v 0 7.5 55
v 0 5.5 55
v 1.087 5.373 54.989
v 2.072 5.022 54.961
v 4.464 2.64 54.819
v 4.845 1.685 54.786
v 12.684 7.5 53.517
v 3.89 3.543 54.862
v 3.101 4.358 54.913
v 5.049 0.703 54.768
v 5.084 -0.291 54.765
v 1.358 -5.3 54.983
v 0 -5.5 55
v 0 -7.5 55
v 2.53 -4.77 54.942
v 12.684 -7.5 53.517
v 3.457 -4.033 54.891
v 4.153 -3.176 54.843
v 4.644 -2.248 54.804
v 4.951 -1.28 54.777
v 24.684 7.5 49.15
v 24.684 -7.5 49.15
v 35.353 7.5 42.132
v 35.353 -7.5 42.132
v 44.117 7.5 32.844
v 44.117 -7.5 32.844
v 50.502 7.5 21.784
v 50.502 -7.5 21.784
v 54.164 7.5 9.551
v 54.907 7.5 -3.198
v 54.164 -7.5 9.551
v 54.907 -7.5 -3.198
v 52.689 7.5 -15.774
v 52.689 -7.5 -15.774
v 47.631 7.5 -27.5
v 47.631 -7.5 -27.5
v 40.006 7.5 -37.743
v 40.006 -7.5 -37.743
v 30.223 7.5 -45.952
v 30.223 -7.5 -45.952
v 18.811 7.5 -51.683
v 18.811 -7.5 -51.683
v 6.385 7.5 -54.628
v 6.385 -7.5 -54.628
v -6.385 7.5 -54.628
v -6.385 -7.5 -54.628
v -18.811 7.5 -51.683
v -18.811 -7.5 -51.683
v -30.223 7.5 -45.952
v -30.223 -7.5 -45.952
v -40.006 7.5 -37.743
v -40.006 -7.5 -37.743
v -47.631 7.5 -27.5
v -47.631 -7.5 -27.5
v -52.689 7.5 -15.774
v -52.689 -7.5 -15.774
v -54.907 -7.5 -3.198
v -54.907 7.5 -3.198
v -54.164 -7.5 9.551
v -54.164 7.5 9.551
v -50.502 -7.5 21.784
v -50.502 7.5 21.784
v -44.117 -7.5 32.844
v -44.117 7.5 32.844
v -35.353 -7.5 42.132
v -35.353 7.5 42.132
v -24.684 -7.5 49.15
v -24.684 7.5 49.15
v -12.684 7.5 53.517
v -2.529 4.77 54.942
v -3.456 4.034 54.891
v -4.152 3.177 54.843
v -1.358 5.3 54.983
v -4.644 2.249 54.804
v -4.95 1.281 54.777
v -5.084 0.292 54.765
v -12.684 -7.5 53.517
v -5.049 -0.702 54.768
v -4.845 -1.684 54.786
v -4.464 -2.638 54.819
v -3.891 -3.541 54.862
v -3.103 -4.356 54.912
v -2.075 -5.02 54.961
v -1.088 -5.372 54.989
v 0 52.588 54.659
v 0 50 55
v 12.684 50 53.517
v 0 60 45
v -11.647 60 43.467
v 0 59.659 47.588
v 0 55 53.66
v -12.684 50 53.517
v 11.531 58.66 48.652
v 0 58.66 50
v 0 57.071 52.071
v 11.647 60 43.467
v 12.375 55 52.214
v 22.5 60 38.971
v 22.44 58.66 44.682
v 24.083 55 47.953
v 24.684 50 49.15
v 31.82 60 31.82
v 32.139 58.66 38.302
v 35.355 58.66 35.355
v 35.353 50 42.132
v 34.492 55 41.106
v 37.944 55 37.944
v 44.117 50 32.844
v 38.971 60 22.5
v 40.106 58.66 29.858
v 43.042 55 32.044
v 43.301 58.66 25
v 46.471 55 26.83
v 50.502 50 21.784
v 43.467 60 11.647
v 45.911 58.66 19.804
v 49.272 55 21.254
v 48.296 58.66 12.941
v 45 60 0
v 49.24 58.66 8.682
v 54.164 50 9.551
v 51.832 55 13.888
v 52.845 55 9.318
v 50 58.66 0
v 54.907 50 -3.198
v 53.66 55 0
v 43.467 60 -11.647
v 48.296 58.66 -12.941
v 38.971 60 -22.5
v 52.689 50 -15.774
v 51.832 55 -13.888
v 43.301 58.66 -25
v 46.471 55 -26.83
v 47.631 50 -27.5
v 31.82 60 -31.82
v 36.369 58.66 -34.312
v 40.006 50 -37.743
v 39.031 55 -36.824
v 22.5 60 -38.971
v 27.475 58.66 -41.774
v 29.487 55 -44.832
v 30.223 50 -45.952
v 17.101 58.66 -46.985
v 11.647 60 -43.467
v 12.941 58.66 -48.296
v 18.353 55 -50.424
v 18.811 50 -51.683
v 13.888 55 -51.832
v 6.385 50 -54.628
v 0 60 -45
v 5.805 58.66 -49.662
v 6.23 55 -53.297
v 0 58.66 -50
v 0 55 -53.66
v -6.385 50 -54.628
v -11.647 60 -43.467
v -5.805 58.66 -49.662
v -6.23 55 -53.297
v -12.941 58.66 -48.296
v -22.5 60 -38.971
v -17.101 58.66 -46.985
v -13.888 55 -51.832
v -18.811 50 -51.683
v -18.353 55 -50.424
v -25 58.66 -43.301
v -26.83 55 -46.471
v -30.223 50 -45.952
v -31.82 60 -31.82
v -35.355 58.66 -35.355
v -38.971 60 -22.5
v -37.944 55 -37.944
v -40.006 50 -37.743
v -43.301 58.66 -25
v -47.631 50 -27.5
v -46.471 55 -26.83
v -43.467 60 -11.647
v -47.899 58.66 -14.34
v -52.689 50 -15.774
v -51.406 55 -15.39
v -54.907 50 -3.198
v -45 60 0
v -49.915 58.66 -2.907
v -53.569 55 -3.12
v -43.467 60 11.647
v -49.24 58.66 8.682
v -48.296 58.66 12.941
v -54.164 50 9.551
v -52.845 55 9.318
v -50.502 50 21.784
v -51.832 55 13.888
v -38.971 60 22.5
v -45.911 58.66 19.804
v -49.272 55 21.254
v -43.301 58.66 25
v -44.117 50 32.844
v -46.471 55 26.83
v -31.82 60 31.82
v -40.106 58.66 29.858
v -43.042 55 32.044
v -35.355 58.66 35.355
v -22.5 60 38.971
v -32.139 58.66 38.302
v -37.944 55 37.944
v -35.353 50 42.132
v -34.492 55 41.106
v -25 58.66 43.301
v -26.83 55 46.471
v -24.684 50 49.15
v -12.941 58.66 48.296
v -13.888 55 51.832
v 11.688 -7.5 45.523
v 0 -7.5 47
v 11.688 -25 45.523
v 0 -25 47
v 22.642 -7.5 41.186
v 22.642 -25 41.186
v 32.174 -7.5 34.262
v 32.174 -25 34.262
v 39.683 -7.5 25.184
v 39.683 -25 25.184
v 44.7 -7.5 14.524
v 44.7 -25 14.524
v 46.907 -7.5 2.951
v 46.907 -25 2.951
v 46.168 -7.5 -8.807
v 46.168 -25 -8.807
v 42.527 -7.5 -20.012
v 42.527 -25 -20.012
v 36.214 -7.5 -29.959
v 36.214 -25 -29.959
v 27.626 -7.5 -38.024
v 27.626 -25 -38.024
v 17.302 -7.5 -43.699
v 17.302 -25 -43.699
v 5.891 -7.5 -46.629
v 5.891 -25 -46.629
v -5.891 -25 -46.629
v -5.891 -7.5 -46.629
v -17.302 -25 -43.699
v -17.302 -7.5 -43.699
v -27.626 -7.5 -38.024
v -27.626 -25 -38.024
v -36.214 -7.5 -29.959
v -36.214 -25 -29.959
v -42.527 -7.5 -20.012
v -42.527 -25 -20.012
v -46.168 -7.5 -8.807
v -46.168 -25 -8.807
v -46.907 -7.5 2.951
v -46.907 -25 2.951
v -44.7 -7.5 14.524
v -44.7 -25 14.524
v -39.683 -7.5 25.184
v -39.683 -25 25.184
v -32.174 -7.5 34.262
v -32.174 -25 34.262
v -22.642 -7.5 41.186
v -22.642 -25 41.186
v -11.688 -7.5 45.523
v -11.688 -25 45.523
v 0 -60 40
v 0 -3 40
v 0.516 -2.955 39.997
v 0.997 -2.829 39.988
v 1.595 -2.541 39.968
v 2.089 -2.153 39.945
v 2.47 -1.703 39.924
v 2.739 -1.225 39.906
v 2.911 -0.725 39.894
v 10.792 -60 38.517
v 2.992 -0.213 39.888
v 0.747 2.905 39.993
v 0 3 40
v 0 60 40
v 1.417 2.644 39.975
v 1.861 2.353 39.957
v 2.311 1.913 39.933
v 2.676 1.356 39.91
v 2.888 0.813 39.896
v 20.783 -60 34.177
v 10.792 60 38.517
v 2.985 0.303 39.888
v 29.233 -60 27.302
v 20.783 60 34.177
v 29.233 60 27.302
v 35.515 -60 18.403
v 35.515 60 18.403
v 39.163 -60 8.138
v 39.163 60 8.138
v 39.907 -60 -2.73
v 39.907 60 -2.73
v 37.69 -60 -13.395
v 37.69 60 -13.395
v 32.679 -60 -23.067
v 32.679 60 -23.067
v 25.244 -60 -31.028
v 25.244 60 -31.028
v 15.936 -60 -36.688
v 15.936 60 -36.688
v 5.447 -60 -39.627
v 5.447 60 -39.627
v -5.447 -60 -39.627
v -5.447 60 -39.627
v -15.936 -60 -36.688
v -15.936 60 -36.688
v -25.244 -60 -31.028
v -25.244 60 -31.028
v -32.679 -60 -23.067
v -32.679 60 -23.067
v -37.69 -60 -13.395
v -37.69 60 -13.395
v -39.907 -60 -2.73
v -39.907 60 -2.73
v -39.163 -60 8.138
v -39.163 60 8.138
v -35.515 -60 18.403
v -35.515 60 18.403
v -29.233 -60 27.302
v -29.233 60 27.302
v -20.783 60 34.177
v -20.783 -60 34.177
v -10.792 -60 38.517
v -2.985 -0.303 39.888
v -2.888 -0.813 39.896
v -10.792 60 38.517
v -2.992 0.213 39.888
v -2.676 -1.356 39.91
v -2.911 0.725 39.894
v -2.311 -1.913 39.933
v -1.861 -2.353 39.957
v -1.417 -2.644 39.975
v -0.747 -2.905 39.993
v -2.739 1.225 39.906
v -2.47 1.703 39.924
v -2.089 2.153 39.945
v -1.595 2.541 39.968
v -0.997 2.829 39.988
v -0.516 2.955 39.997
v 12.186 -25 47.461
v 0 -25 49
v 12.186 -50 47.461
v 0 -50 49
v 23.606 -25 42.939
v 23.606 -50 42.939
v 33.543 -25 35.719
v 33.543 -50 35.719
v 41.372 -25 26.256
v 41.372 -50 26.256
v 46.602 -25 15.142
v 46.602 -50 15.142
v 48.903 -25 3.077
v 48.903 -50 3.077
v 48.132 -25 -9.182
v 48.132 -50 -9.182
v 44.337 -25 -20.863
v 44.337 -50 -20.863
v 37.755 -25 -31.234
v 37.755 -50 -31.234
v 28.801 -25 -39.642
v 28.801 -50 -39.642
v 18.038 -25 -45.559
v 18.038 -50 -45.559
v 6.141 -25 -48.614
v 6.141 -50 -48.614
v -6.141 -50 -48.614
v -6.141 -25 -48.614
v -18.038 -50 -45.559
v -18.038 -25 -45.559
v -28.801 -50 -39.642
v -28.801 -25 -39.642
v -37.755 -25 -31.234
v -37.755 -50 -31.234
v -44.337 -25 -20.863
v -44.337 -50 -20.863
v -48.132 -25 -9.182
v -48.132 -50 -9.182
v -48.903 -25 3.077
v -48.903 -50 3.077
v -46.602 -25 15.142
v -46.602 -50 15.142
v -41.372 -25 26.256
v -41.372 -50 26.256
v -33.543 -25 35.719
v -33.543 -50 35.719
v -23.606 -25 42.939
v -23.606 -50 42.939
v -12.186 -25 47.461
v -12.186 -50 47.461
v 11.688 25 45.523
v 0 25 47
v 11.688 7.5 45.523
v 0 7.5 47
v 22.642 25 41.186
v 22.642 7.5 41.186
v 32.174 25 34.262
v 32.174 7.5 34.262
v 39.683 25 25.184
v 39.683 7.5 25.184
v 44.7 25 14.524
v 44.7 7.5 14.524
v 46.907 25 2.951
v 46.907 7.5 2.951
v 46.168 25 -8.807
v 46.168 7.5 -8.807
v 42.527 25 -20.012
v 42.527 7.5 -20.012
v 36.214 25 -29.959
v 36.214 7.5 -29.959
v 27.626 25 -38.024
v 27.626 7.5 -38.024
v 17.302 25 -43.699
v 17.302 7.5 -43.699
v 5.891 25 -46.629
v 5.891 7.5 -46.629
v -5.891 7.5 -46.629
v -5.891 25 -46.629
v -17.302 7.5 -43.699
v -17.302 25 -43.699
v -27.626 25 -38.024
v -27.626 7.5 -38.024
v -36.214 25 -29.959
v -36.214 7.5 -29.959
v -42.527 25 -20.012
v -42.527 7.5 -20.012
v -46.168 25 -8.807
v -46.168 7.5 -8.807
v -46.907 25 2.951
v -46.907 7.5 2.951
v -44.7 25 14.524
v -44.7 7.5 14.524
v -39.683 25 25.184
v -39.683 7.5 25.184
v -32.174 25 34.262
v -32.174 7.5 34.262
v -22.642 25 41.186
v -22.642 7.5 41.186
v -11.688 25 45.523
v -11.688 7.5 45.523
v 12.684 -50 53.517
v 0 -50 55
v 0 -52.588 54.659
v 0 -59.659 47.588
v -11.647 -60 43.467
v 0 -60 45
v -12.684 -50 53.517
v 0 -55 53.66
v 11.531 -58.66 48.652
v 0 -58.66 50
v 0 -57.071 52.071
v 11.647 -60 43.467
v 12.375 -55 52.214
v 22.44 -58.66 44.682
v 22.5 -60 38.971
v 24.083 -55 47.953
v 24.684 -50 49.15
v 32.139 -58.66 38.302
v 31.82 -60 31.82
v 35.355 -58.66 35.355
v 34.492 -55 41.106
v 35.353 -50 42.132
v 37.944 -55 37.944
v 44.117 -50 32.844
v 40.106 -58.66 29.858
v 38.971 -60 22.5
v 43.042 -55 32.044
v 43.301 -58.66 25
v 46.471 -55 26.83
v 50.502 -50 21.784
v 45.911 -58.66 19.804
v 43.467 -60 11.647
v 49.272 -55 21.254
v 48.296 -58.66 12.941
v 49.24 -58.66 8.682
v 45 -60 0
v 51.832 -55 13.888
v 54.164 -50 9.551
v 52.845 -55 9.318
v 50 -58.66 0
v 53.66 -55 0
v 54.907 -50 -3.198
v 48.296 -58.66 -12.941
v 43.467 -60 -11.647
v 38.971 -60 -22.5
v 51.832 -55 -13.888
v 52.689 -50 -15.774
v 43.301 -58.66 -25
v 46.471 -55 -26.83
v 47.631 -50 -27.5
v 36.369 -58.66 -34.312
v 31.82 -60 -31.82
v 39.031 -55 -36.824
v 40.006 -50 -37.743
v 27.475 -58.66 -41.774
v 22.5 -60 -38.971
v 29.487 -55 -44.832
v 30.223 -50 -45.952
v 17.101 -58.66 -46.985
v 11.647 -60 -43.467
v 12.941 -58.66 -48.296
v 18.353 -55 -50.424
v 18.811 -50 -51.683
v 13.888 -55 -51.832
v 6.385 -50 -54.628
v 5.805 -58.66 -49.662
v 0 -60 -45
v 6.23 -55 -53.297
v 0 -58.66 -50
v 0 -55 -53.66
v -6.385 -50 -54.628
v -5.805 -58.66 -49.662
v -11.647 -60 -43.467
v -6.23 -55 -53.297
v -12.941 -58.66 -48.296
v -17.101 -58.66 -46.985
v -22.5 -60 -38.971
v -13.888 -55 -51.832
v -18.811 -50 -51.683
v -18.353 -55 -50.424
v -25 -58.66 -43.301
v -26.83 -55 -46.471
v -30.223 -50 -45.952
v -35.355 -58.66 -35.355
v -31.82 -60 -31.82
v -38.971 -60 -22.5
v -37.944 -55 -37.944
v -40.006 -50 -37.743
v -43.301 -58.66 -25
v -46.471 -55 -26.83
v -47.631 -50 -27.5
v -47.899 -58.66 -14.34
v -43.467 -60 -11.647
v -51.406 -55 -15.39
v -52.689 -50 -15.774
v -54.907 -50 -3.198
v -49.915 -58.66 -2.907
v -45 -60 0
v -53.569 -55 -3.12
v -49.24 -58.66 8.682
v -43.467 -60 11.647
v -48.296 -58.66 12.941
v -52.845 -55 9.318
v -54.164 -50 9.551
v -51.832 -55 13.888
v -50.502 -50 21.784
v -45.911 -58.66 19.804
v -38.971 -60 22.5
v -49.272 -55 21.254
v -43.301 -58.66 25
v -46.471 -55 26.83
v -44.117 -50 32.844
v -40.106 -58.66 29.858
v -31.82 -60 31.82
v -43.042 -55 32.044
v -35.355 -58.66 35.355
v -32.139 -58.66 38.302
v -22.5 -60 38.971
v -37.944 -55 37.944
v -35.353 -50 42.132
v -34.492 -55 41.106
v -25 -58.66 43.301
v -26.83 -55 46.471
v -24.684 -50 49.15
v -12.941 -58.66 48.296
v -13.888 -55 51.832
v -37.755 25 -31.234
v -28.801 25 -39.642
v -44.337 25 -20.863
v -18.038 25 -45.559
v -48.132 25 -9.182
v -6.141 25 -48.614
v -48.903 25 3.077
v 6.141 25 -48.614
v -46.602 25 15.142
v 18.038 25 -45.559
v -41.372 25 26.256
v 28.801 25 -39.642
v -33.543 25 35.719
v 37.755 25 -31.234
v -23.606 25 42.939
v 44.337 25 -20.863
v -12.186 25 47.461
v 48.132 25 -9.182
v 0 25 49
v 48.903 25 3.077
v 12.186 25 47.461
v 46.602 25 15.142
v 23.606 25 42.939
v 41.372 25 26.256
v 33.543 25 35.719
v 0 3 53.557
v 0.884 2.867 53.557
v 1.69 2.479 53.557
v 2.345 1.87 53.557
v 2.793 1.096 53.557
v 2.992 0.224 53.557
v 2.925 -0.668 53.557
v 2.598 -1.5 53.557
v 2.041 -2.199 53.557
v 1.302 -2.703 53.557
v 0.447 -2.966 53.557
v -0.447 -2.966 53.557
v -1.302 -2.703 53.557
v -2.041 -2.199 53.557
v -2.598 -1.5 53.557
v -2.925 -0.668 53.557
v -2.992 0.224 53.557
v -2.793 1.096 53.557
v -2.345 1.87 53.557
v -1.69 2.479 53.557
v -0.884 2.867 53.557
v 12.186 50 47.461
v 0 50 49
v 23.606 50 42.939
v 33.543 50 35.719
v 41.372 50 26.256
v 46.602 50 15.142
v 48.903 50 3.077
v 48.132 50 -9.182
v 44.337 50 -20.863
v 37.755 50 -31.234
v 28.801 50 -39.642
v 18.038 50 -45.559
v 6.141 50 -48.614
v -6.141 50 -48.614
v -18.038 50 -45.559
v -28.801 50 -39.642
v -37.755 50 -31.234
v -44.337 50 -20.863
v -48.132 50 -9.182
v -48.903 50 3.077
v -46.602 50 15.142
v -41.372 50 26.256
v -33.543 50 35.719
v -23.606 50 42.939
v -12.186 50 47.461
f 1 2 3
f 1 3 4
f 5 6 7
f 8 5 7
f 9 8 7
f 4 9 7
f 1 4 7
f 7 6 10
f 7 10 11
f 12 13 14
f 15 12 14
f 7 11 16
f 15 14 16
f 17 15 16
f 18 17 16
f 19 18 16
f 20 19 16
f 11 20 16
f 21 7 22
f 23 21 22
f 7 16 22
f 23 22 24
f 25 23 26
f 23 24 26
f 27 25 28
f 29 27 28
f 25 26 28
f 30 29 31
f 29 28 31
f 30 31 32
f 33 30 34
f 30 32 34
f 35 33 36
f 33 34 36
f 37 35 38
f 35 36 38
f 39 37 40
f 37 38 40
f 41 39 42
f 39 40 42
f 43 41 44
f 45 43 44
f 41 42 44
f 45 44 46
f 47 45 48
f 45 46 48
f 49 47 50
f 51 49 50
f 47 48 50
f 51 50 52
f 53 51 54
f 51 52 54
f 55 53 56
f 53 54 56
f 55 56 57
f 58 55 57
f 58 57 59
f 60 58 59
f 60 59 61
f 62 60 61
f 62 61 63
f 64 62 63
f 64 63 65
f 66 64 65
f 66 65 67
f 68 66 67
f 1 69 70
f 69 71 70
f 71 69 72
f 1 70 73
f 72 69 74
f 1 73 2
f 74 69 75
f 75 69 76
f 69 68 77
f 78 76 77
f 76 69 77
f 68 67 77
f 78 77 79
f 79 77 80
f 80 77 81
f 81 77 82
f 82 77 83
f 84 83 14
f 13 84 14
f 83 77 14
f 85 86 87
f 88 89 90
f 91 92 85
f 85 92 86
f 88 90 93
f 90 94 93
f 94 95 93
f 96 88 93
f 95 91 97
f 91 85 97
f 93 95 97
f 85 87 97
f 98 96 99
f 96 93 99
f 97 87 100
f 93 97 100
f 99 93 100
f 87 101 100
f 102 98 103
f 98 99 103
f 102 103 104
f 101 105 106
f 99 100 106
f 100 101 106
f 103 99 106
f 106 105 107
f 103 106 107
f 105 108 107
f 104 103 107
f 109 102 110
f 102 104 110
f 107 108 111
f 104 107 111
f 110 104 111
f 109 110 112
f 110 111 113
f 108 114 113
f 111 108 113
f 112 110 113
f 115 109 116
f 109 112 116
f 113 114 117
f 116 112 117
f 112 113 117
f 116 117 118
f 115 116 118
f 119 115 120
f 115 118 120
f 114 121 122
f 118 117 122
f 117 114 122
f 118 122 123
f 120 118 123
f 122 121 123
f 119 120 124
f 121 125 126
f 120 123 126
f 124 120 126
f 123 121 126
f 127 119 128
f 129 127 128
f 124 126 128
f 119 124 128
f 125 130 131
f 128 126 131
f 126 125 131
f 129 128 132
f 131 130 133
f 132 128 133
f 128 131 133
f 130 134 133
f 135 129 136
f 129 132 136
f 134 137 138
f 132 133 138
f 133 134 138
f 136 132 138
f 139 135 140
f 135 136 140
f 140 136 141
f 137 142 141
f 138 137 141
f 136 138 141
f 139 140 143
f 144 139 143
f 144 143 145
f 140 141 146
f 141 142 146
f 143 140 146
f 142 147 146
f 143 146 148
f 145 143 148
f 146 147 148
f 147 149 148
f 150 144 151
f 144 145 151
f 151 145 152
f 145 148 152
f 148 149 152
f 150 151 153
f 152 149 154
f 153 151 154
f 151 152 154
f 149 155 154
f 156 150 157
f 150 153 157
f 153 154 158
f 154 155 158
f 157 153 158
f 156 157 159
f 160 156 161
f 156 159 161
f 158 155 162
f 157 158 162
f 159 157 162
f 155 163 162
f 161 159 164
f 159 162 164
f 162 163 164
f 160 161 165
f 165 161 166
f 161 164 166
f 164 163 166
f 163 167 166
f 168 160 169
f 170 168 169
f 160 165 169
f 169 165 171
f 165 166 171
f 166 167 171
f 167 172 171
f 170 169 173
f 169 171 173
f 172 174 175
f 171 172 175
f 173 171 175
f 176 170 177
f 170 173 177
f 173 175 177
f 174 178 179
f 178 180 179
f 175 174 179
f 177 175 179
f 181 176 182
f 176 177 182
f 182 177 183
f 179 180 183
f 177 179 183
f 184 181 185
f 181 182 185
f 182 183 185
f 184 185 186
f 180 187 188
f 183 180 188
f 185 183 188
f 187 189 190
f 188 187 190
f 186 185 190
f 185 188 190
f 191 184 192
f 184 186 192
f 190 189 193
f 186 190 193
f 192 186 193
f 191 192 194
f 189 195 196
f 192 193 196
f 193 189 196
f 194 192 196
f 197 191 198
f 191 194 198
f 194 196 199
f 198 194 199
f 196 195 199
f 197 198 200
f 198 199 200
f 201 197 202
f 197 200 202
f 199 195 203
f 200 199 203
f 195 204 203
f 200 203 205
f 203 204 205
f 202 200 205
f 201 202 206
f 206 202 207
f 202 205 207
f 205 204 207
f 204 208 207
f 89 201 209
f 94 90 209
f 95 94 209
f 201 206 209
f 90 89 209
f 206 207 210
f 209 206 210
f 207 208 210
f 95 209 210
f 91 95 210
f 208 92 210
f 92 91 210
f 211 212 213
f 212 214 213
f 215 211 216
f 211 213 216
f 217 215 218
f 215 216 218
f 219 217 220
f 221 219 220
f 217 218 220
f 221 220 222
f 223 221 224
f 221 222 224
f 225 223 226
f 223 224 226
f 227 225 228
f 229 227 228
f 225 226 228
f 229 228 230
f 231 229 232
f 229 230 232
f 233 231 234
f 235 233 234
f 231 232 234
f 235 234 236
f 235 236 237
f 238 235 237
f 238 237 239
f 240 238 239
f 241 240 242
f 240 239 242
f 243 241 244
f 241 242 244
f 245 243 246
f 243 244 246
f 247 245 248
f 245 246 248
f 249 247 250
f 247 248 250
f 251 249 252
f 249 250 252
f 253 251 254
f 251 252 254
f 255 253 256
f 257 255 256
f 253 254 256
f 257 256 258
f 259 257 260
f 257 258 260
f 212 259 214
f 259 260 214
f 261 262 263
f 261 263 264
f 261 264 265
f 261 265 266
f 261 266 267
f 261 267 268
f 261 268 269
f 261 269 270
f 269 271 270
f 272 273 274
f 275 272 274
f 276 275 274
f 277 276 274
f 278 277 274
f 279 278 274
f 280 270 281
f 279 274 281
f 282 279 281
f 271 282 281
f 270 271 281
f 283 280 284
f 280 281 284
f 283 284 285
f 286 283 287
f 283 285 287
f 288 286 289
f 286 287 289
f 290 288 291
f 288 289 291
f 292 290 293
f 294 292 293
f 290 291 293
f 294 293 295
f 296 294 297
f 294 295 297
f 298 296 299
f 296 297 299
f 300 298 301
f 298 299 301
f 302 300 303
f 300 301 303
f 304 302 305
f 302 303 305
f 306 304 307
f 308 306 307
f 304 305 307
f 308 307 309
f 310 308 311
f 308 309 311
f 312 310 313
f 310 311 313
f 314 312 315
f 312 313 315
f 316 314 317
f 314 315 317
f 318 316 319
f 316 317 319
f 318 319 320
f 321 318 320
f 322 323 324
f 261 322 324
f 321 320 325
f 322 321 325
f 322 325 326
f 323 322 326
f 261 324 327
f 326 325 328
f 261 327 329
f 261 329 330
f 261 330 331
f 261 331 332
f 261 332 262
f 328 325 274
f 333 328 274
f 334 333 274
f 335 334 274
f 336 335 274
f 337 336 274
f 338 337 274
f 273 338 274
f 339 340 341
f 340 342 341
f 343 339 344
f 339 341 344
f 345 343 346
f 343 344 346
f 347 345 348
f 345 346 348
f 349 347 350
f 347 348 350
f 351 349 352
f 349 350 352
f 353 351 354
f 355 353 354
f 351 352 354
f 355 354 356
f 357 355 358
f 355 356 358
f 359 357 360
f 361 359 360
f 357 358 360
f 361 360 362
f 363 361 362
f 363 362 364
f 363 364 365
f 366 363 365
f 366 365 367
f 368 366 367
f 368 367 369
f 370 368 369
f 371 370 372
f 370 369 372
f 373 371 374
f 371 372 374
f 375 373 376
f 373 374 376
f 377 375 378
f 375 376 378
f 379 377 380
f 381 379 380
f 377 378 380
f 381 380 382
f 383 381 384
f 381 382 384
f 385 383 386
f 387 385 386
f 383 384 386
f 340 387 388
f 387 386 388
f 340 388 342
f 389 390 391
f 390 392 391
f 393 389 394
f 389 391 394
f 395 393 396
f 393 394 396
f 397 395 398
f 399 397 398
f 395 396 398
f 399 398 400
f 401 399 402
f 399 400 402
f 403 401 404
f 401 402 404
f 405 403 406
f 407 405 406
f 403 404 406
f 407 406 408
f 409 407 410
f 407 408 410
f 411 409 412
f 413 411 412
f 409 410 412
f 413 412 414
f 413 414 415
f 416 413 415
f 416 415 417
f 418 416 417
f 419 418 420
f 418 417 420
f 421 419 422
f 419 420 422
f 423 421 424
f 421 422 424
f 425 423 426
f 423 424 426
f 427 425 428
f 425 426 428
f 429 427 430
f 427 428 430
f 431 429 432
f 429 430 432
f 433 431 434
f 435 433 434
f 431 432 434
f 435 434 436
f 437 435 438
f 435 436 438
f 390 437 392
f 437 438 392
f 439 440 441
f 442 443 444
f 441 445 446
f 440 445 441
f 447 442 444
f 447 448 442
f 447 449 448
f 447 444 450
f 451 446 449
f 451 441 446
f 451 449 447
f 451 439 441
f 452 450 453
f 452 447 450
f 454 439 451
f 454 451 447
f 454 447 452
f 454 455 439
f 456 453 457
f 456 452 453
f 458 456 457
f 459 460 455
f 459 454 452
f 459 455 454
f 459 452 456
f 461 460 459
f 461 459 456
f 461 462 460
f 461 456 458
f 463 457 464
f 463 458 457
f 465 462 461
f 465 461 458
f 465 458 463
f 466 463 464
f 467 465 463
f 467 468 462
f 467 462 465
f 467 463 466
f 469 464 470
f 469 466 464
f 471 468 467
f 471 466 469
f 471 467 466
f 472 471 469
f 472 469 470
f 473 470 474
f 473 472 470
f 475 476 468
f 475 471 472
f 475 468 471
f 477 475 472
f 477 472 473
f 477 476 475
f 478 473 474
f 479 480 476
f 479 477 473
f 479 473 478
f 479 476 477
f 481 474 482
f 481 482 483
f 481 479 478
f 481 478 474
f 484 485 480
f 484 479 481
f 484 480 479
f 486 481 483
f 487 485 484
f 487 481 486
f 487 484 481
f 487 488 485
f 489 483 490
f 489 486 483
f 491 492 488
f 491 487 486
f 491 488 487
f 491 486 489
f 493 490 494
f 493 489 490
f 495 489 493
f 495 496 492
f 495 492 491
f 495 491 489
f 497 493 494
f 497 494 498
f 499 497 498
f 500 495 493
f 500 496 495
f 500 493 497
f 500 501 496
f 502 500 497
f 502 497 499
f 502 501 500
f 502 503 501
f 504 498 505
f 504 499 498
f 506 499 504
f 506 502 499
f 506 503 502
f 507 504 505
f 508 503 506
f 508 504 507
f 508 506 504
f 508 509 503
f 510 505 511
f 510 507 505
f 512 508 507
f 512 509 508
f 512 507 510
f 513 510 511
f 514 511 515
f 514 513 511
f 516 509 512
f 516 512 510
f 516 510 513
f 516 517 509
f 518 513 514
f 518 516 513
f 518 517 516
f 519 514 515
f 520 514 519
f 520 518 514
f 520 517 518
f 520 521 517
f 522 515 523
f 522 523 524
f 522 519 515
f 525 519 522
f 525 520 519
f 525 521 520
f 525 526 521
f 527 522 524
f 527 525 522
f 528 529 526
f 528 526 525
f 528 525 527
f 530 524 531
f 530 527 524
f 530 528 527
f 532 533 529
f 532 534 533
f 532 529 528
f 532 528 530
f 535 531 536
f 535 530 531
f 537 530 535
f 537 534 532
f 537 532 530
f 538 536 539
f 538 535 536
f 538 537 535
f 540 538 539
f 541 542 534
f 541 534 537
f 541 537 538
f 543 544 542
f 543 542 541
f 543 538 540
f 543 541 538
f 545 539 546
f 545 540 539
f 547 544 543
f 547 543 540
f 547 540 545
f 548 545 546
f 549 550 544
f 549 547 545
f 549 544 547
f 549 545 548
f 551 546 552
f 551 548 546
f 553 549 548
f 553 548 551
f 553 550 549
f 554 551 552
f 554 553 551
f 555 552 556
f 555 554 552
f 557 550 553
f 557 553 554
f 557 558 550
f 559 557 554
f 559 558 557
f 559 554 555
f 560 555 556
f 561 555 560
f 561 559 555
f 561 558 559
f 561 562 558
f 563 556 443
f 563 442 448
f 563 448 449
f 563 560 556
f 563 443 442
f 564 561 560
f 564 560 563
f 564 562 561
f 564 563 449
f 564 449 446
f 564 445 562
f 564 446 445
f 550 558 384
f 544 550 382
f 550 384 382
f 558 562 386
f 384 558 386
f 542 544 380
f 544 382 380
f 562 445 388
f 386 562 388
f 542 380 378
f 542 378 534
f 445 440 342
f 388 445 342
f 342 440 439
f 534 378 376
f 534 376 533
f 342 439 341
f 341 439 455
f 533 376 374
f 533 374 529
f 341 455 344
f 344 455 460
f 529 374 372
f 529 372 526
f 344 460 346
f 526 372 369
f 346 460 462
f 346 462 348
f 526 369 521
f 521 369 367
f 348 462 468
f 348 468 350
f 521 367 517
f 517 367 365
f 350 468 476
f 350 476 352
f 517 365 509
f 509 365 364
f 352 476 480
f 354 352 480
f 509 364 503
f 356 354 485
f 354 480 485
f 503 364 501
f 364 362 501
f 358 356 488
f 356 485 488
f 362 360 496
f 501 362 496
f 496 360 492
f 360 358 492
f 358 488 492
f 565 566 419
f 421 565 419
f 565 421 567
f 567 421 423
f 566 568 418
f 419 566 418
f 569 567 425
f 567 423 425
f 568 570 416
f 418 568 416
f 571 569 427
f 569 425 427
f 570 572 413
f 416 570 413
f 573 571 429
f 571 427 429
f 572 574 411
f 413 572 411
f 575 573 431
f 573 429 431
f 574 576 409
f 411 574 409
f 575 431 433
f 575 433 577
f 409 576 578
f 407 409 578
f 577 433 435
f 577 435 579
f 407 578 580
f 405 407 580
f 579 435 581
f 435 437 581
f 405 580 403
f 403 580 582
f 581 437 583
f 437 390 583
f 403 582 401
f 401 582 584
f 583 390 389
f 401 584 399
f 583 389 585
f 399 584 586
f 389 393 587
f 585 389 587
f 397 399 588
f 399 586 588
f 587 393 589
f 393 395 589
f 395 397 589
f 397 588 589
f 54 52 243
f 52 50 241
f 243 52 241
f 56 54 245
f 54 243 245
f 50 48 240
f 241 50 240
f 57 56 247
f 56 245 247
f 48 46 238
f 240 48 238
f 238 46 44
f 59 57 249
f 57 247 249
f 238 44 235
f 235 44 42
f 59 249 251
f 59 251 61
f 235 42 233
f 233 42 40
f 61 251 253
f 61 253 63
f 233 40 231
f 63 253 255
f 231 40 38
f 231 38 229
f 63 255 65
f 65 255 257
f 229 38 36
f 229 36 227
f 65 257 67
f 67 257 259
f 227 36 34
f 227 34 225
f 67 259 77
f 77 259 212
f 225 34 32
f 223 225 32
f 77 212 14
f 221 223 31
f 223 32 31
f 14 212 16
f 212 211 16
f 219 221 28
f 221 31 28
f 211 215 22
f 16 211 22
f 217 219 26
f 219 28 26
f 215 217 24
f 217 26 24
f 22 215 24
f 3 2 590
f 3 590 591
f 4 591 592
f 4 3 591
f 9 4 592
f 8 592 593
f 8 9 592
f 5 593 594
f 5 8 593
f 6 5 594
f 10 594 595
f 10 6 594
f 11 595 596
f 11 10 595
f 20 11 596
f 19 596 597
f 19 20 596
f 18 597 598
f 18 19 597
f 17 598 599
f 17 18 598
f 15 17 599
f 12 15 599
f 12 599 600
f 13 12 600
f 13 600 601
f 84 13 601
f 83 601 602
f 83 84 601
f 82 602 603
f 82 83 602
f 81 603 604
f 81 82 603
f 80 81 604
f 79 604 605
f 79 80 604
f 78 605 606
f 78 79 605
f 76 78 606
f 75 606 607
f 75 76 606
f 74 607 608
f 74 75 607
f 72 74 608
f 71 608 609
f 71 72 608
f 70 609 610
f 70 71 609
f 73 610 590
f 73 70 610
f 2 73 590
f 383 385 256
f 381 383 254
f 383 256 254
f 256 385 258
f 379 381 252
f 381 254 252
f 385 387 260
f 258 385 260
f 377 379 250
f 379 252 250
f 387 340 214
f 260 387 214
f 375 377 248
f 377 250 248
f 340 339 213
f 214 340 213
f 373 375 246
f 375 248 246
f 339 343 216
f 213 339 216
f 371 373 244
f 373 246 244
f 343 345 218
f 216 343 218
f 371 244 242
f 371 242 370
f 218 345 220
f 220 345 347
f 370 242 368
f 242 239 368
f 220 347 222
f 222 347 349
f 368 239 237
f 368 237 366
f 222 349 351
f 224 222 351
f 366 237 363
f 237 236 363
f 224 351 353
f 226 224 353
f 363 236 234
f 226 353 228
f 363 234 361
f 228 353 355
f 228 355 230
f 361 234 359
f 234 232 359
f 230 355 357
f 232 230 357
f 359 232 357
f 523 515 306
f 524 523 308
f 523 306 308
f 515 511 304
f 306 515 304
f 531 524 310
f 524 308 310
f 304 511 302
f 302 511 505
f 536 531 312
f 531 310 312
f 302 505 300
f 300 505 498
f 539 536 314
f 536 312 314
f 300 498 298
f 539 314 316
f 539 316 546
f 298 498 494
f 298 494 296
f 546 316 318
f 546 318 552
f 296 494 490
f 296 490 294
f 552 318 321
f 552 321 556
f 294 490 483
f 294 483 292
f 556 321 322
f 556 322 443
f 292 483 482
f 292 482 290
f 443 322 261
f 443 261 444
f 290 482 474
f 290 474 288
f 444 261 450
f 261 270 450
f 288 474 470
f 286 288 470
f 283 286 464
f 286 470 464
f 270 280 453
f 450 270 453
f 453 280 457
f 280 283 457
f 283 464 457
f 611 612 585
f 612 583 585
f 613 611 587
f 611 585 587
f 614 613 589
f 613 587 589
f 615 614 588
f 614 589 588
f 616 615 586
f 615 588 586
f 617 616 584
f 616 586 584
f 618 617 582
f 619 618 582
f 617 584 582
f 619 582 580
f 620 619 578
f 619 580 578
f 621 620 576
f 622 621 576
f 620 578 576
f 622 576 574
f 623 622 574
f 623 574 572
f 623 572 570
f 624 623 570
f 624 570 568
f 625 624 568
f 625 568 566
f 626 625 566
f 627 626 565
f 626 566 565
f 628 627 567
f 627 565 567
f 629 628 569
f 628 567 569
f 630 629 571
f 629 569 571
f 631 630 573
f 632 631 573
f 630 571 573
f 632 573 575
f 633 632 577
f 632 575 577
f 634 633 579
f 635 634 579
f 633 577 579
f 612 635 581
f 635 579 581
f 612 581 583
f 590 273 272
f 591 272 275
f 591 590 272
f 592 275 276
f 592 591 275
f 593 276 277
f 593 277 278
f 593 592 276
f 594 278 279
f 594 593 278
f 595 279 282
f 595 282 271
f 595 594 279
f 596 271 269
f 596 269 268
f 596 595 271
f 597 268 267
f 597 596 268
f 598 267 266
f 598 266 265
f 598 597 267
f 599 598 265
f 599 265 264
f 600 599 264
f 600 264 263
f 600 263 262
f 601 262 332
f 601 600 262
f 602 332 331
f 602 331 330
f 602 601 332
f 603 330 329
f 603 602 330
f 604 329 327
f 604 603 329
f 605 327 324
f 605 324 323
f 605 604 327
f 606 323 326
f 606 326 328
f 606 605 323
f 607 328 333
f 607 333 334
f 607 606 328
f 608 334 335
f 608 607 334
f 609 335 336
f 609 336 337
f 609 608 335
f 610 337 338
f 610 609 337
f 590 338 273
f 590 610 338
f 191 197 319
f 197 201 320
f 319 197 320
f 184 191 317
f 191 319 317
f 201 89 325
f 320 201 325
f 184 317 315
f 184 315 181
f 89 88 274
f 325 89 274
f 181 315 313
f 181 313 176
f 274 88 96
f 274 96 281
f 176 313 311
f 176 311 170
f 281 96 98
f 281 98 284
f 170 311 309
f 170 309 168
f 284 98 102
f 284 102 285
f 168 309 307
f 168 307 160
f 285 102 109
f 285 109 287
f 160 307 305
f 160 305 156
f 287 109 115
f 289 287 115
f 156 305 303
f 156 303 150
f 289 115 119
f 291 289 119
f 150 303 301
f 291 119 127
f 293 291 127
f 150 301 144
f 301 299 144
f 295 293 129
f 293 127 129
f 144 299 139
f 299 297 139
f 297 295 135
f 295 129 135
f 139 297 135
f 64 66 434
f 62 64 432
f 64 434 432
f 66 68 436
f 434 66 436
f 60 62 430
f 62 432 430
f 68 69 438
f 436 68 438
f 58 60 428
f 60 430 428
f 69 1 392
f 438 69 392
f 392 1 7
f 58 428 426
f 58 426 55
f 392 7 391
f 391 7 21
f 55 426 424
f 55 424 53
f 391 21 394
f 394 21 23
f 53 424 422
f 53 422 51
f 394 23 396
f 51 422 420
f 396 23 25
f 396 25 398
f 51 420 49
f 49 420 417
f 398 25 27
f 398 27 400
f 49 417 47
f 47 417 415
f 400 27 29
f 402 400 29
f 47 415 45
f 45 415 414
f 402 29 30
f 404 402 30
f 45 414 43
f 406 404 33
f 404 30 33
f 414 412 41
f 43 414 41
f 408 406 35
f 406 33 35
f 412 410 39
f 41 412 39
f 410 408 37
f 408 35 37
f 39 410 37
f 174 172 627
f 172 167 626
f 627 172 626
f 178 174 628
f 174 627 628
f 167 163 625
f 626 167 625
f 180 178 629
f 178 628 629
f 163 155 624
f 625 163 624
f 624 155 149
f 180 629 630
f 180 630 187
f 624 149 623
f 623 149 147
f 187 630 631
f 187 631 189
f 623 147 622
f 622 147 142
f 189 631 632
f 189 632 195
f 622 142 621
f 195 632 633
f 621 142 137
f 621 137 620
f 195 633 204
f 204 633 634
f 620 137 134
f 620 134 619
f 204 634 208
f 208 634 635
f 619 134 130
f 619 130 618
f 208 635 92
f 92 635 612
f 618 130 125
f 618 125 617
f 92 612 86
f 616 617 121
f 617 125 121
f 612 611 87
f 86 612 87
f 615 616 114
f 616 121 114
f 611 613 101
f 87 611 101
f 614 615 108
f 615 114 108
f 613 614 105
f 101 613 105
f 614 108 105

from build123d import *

# Parameters (mm, degrees)
F4_R = 9.99999


# Not quite as in the source:
# - a fillet or chamfer is up to 0.001 mm smaller than in the source, because OpenCascade refuses the exact size


with BuildPart() as f1:
    # F0 (on Right) → F1 (revolve)
    with BuildSketch(Plane.YZ):
        Polygon((-60, 55), (-60, 40), (60, 40), (60, 55), (50, 55), (50, 49), (25, 49), (25, 47), (7.5, 47), (7.5, 55), (-7.5, 55), (-7.5, 47), (-25, 47), (-25, 49), (-50, 49), (-50, 55), align=None)
    revolve(axis=Axis((0, -7.7097125049, 0), (0, 1, 0)))

    # F2 (on Right) → F3 (revolve, cut)
    with BuildSketch(Plane.YZ):
        Polygon((7.2320508076, 56), (0, 56), (0, 36), (3, 36), (3, 53.556624327), align=None)
    revolve(axis=Axis((0, 0, 50.0545714922), (0, 0, -1)), mode=Mode.SUBTRACT)

    # F4 (radius 10 in the source; OpenCascade refuses exactly that, so slightly less here)
    f4_edges = [f1.edges().sort_by_distance(p)[0] for p in [
        (0, 60, -55),
        (0, -60, -55),
    ]]
    fillet(f4_edges, radius=F4_R)


solid = f1.part
